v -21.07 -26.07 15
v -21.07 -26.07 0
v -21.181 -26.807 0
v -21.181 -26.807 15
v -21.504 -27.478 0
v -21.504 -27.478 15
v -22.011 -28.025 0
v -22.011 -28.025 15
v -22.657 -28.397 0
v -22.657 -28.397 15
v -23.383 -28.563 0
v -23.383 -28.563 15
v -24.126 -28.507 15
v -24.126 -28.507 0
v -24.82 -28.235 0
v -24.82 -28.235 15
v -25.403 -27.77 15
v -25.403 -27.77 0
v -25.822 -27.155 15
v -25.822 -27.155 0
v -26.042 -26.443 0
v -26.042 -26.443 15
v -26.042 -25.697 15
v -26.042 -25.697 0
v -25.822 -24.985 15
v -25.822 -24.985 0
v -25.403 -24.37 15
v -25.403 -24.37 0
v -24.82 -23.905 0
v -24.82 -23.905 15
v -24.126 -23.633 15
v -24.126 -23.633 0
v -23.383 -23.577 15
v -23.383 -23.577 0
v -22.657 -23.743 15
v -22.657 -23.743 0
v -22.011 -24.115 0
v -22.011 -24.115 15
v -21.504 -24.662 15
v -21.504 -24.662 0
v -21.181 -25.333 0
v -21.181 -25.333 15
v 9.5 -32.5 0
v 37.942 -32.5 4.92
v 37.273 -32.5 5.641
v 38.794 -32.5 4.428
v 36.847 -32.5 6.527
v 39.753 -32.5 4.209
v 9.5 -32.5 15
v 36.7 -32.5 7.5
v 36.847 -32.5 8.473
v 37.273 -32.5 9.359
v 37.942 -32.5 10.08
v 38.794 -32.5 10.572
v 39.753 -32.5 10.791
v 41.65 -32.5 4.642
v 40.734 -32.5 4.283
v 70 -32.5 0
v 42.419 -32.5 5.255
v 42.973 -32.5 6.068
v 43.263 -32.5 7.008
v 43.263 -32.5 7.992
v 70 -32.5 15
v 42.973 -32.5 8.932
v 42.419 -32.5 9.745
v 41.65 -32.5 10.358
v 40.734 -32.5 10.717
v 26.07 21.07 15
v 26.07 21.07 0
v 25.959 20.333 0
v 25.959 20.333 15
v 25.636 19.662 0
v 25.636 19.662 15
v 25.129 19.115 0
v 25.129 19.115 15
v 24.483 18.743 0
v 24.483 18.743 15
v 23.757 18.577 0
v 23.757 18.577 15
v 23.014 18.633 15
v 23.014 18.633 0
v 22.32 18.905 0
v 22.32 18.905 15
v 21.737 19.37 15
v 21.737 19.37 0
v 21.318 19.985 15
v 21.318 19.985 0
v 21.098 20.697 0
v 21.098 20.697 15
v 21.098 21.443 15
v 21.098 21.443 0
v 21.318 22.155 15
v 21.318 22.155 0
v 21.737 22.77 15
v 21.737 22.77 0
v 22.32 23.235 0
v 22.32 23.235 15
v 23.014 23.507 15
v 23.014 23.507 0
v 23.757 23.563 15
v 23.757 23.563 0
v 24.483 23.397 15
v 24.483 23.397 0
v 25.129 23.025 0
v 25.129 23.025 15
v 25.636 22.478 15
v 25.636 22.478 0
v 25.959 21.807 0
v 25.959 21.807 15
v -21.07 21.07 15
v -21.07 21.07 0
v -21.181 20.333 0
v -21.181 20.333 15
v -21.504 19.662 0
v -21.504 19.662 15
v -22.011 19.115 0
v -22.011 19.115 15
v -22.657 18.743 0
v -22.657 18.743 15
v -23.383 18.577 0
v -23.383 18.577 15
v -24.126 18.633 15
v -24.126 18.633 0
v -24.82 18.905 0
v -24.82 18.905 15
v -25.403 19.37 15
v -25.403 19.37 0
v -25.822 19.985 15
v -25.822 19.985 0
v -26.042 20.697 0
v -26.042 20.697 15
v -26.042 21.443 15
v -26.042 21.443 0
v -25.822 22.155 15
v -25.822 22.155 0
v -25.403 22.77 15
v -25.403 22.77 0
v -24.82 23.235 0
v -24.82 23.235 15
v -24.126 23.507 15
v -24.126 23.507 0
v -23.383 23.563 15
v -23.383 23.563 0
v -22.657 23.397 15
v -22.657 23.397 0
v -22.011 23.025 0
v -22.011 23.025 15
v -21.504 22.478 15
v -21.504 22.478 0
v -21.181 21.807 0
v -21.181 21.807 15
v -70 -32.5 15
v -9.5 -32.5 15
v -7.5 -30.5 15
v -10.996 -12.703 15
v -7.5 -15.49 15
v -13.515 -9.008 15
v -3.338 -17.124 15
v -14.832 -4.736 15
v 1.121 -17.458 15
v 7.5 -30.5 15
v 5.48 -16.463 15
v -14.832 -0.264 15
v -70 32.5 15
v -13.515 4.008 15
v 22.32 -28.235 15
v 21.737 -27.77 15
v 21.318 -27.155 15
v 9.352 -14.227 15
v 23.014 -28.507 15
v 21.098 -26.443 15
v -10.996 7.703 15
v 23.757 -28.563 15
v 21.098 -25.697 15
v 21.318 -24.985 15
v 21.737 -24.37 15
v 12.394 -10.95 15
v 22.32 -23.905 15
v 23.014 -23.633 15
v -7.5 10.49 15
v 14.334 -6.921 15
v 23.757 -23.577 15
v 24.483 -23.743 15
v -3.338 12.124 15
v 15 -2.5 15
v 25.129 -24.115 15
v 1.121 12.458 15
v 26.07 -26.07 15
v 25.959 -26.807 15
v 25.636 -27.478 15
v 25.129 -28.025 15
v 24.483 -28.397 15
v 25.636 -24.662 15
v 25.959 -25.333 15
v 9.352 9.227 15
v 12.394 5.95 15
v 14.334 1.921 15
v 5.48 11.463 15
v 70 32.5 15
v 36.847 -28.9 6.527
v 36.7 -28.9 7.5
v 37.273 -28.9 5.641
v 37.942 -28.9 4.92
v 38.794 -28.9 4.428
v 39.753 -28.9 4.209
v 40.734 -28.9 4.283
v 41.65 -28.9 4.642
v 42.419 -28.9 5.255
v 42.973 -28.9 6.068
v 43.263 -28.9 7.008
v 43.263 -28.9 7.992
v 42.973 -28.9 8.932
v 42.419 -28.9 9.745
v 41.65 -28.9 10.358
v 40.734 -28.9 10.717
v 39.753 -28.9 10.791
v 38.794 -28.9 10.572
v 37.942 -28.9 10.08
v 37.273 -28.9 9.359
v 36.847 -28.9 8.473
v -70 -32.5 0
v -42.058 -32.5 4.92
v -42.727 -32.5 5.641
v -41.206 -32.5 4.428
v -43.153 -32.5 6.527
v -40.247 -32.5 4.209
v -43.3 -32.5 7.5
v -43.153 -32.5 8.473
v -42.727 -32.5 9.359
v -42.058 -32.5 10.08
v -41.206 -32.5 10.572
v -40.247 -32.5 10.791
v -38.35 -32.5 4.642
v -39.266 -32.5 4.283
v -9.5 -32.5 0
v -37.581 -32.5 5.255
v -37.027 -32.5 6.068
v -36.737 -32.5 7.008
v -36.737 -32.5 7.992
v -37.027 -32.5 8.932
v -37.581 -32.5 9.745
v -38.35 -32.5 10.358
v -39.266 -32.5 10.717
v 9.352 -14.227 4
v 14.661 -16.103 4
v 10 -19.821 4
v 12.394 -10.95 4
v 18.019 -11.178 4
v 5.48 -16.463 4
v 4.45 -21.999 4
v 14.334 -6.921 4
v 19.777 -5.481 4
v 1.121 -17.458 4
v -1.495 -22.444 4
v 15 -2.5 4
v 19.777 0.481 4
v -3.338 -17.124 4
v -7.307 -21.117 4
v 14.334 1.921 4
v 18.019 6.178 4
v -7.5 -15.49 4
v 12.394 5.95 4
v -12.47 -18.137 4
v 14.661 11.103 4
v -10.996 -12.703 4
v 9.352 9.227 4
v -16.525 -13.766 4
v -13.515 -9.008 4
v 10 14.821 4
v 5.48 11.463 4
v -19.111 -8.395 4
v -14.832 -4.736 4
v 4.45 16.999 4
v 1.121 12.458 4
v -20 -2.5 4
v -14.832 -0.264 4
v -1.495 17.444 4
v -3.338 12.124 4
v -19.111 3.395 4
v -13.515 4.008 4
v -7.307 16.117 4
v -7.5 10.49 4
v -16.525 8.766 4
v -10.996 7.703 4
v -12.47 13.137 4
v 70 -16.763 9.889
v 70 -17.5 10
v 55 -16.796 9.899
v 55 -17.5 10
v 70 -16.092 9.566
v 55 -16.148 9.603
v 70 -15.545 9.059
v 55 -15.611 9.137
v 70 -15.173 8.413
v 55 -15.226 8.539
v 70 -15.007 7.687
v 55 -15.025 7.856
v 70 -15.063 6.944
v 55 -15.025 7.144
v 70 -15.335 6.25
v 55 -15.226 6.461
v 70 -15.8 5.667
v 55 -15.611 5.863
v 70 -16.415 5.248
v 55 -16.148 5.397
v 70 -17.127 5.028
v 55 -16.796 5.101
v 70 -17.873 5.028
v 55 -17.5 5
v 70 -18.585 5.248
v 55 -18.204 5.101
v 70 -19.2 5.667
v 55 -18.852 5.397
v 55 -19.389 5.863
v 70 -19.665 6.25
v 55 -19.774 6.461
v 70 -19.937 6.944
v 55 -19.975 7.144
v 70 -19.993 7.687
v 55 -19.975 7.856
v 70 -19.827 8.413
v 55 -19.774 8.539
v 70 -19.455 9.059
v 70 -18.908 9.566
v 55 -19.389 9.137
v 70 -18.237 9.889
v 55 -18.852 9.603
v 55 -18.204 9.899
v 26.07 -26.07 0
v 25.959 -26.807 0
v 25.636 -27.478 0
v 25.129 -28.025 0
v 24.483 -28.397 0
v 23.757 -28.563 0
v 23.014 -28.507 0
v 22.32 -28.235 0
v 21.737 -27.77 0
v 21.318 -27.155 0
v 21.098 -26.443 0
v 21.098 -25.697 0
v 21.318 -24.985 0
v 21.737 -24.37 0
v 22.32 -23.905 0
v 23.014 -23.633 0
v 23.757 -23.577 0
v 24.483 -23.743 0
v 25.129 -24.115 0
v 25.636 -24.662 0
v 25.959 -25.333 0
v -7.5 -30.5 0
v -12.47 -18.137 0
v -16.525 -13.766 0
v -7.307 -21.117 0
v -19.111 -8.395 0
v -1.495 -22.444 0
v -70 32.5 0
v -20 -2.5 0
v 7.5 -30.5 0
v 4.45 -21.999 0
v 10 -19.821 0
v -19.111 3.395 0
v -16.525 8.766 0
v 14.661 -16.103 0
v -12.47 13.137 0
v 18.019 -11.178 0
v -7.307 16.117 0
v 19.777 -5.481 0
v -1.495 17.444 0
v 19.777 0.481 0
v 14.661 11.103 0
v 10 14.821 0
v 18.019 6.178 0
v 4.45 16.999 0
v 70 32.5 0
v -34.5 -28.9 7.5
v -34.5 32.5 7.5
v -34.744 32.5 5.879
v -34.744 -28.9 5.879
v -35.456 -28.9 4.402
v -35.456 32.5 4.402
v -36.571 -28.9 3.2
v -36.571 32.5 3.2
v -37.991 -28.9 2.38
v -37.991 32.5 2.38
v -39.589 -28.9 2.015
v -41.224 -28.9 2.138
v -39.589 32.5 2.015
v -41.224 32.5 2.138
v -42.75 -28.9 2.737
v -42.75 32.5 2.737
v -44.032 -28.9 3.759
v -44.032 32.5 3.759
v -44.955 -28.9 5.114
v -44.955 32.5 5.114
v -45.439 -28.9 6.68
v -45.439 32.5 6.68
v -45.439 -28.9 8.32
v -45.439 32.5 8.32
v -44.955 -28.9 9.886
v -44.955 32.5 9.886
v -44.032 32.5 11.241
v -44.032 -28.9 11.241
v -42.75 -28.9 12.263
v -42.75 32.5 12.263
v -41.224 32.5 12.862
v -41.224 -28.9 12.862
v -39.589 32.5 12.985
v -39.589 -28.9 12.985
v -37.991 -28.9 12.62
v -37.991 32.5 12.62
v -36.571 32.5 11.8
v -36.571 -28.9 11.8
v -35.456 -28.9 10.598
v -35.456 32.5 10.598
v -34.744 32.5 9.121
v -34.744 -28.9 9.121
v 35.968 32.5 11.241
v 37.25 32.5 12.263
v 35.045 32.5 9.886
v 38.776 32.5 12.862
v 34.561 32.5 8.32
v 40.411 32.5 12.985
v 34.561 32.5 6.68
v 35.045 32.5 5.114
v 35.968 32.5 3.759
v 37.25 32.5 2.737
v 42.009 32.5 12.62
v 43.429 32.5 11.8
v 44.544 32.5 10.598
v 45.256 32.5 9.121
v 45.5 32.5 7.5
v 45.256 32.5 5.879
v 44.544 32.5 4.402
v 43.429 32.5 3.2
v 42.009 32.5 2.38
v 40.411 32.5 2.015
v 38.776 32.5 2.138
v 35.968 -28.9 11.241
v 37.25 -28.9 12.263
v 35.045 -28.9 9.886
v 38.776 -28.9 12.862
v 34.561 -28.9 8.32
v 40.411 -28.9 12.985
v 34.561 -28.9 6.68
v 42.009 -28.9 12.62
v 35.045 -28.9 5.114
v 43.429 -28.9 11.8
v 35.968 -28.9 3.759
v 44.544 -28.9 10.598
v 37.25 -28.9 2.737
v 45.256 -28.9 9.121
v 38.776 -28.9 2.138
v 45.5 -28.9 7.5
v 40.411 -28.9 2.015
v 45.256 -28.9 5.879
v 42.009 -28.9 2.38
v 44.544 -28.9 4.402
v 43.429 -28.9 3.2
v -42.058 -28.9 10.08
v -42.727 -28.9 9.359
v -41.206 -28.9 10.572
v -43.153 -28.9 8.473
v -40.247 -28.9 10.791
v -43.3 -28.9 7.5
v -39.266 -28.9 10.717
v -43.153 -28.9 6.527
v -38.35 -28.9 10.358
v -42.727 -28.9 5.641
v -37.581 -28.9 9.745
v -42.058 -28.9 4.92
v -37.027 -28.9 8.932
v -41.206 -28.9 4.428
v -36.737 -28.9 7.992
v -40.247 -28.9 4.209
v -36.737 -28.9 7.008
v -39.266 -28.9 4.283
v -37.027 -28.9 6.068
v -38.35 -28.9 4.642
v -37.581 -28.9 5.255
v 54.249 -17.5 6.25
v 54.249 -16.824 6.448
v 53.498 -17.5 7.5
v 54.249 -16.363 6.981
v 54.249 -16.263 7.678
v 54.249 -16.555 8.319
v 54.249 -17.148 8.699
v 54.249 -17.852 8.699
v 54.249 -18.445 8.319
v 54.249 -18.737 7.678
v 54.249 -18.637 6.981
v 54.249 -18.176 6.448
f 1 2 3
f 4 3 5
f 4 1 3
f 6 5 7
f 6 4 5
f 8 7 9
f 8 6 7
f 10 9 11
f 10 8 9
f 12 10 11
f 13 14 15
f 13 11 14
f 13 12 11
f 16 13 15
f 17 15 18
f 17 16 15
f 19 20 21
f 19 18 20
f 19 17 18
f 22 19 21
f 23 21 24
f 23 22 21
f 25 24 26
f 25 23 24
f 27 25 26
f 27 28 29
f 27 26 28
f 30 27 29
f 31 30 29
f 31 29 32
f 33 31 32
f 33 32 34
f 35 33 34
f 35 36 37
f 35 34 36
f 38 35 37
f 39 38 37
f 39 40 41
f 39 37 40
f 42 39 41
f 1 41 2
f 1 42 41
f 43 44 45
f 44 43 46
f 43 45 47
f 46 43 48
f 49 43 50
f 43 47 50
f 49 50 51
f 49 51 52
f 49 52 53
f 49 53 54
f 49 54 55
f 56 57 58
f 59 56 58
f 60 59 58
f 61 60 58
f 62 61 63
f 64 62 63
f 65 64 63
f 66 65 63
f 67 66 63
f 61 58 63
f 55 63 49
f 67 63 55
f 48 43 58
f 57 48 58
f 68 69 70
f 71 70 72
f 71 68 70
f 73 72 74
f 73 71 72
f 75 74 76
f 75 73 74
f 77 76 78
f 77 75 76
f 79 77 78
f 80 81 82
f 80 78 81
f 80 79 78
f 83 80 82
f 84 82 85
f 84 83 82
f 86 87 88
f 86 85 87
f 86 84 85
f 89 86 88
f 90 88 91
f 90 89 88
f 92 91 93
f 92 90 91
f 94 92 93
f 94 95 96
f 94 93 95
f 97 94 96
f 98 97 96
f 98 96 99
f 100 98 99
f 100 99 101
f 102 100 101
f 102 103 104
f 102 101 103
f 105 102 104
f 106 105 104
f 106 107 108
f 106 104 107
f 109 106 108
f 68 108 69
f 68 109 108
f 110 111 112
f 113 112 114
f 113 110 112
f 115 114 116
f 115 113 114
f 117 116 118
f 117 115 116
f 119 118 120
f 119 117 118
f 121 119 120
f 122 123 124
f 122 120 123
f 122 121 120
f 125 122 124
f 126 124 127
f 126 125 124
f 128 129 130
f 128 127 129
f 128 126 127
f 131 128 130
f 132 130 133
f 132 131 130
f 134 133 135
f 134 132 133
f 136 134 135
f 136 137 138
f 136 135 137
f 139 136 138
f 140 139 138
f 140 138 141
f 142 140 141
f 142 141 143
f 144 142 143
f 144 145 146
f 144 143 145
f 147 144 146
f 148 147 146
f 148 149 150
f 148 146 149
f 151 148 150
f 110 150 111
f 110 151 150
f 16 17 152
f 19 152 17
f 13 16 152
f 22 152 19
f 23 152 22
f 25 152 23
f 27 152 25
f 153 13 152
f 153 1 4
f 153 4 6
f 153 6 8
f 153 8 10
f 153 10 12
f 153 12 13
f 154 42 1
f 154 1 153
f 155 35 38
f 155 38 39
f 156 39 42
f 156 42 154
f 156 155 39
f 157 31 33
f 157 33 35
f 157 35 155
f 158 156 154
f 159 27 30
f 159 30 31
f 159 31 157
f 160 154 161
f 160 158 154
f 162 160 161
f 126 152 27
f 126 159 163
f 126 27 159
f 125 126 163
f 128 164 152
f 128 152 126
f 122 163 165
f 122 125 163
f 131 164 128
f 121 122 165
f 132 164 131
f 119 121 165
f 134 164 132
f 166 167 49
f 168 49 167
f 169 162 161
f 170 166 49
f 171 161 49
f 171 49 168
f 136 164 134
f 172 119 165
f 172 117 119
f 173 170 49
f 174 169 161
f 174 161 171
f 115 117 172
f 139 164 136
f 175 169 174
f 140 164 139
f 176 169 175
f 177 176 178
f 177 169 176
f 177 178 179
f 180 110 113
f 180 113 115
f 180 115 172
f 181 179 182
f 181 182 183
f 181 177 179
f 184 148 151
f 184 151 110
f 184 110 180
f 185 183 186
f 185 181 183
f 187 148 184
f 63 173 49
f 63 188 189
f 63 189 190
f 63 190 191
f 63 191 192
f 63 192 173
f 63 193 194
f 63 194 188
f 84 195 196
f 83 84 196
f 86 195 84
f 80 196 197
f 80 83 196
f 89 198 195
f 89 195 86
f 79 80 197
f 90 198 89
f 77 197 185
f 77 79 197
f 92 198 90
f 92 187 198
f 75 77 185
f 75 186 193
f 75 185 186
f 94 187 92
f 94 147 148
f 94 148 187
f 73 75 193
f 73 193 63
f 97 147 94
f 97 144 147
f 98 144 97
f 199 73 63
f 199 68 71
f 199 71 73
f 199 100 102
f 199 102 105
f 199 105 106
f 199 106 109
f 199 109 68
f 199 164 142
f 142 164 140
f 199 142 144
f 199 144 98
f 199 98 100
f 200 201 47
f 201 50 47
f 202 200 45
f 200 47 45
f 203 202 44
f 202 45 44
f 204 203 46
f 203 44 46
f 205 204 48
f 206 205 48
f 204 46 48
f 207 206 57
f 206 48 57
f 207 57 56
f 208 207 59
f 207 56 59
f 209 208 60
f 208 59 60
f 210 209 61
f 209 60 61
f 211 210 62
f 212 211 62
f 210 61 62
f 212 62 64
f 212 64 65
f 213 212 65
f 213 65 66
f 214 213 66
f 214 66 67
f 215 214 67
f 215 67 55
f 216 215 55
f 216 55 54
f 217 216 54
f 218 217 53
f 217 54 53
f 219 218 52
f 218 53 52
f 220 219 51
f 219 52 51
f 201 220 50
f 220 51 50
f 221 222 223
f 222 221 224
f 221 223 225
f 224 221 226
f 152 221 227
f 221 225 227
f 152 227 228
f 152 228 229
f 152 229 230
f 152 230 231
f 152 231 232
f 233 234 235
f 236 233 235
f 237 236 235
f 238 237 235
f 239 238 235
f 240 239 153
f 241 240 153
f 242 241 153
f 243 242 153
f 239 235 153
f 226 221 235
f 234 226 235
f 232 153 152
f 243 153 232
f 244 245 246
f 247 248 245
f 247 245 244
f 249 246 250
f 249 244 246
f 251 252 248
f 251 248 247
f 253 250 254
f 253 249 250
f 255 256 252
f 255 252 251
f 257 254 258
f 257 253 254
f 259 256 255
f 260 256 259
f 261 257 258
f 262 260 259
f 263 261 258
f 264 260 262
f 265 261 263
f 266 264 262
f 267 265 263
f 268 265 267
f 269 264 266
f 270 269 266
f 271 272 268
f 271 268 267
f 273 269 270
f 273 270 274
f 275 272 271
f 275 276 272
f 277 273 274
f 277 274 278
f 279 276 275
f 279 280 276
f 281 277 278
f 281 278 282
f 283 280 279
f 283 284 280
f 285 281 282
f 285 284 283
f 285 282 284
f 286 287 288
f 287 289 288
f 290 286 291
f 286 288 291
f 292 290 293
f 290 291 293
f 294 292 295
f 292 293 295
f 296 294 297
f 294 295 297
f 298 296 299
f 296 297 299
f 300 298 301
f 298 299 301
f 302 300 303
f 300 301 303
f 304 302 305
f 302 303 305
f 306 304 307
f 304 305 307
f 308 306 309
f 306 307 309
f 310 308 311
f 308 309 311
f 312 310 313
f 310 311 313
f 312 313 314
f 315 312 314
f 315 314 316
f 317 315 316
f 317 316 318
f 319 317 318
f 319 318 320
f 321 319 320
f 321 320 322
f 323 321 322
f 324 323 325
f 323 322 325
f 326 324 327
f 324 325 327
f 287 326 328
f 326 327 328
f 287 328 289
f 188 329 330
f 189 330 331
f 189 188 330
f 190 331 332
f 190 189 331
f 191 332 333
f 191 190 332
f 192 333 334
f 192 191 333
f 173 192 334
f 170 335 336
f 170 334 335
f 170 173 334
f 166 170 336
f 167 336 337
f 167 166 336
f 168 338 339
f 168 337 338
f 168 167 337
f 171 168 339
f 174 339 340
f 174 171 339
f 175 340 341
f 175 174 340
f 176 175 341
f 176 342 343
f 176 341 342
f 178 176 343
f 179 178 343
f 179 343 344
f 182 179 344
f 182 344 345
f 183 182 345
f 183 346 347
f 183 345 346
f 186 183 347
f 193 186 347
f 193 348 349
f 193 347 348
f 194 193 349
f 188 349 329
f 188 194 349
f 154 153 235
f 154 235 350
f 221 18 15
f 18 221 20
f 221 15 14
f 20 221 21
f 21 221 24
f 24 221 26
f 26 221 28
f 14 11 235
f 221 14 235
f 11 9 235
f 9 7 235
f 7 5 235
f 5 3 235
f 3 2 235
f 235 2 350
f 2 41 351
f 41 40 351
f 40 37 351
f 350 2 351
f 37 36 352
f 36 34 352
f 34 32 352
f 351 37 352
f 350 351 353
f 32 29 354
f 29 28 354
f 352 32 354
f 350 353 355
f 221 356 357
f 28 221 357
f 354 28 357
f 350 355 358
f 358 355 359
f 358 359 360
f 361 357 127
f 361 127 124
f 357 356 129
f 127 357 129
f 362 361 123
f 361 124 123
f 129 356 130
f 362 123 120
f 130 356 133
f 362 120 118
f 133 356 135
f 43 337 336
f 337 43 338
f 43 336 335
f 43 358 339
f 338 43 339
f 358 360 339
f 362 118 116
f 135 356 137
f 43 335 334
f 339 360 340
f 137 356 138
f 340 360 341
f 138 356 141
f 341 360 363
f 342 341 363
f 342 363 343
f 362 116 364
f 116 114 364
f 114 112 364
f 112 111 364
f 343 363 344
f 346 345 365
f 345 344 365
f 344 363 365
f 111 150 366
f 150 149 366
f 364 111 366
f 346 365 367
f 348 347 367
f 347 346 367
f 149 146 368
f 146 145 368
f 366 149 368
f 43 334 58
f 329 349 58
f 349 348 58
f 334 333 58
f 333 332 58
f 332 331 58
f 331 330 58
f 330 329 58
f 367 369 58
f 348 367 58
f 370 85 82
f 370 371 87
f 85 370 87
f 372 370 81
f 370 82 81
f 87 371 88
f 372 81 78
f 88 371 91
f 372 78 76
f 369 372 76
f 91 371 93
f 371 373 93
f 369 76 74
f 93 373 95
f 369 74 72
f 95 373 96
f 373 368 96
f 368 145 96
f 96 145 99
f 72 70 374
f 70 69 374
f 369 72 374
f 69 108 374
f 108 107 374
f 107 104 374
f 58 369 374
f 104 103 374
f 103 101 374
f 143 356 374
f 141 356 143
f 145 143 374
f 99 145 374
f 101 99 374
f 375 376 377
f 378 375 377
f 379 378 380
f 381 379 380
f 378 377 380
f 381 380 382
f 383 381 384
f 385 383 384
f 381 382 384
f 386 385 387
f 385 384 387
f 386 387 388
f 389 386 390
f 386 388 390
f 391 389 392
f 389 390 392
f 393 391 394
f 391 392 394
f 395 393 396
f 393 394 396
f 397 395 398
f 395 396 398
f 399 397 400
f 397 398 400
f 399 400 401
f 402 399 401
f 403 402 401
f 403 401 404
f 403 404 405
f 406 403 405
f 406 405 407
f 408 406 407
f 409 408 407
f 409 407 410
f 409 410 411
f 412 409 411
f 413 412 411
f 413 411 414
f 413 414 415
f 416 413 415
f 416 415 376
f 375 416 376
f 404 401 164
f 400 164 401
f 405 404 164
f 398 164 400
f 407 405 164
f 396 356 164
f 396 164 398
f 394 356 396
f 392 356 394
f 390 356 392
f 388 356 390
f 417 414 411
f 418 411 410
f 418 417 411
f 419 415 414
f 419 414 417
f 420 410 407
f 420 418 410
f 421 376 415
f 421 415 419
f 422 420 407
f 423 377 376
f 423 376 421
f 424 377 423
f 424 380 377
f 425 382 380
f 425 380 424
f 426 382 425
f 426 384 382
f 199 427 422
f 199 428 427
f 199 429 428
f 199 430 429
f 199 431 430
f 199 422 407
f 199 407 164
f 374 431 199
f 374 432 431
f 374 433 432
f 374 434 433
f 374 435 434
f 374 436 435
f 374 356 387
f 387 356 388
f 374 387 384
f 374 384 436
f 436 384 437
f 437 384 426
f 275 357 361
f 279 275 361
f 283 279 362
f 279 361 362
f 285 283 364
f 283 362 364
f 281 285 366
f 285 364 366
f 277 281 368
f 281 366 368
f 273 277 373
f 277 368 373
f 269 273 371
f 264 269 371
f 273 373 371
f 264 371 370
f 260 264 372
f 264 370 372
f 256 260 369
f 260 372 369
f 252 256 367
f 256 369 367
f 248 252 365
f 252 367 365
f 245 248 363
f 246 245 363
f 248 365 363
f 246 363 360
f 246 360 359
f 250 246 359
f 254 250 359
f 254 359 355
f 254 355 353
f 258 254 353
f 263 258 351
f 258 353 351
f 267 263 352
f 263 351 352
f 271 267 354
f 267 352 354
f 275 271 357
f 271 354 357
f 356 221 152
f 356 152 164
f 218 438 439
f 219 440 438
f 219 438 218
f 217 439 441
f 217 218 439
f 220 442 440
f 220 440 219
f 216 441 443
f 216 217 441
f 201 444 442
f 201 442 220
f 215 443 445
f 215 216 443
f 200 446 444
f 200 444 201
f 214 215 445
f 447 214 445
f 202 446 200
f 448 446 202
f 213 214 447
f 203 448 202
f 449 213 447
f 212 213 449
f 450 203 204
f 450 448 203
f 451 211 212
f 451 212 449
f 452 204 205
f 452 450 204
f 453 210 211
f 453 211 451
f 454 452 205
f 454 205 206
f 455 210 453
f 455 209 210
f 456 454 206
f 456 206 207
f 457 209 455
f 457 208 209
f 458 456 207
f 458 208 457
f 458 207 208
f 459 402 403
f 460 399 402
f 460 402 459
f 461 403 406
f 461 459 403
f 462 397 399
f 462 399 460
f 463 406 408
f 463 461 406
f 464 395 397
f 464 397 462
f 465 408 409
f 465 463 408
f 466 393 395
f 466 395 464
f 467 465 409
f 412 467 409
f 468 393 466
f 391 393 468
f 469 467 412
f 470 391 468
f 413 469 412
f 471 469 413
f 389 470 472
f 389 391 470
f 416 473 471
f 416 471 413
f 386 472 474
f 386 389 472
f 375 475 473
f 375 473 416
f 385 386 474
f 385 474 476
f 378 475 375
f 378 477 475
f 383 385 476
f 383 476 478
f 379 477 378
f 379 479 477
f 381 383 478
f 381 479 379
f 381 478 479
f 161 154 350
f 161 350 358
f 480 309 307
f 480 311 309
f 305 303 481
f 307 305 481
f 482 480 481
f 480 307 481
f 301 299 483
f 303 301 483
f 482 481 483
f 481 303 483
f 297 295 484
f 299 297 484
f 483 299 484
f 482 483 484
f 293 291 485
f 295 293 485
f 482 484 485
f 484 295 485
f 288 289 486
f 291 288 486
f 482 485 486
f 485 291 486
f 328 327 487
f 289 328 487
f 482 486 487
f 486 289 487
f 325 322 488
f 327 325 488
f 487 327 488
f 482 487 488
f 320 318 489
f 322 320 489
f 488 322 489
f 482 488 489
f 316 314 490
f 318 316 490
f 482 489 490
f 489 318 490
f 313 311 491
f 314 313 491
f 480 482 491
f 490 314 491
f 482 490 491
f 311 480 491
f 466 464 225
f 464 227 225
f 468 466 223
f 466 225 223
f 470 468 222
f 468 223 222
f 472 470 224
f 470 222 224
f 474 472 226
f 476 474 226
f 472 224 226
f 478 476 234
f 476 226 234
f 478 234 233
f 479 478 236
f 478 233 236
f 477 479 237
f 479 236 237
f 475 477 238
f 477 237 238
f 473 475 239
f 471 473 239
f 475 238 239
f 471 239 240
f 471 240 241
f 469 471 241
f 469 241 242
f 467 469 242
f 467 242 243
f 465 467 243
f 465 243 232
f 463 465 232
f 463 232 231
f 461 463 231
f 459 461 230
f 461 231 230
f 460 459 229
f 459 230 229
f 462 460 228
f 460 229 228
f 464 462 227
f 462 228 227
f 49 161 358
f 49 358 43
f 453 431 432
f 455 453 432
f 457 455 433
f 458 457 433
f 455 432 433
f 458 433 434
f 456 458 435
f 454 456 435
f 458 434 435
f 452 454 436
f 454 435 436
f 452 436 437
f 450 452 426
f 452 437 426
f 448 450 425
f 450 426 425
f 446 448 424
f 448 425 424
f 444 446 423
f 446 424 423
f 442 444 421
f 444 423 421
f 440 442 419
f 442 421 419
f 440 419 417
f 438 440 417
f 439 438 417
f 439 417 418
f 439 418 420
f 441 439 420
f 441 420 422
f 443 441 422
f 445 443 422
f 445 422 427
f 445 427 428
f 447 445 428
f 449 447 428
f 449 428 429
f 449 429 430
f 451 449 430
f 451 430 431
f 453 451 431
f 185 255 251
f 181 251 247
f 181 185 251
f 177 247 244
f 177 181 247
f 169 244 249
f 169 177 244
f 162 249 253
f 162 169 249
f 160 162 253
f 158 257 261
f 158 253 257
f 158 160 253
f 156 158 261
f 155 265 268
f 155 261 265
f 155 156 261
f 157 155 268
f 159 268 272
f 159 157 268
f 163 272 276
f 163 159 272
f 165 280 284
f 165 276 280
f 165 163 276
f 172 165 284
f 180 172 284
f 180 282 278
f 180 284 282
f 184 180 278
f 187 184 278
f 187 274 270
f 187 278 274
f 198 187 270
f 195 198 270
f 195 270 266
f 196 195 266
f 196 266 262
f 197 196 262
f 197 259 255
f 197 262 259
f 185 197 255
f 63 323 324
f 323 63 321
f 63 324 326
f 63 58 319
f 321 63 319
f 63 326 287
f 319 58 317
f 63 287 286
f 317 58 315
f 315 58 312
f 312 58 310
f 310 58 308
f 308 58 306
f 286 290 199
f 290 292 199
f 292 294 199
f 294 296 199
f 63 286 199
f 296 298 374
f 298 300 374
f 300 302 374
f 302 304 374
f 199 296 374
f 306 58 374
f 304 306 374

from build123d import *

# Parameters (mm, degrees)
SKETCH1_W                                           = 140
SKETCH1_H                                           = 65
BOSS_EXTRUDE1_DEPTH                                 = 15
SKETCH2_R                                           = 15
SKETCH2_R_2                                         = 2.5
CUT_EXTRUDE2_DEPTH                                  = 27
TAP_DRILL_FOR_M6_TAP1_D                             = 5
TAP_DRILL_FOR_M6_TAP1_DEPTH                         = 15
TAP_DRILL_FOR_M6_TAP1_TIP                           = 1.502151548
CBORE_FOR_M6_HEX_SOCKET_HEAD_CAP_SCREW3_D           = 6.6
CBORE_FOR_M6_HEX_SOCKET_HEAD_CAP_SCREW3_CBORE_D     = 11
CBORE_FOR_M6_HEX_SOCKET_HEAD_CAP_SCREW3_CBORE_DEPTH = 61.4
SKETCH29_W                                          = 35
SKETCH29_H                                          = 2
CUT_EXTRUDE6_DEPTH                                  = 79.620925968
CHAMFER2_SIZE                                       = 10
SKETCH30_R                                          = 20
CUT_EXTRUDE7_DEPTH                                  = 4


with BuildPart() as part:
    # Sketch1 → Boss-Extrude1 (new body)
    with BuildSketch(Plane.XY):
        Rectangle(SKETCH1_W, SKETCH1_H)
    extrude(amount=BOSS_EXTRUDE1_DEPTH)

    # Sketch2 → Cut-Extrude2 (cut)
    with BuildSketch(Plane(origin=(0, 0, 15), x_dir=(-1, 0, 0), z_dir=(0, 0, -1))):
        with Locations(Location((0, -2.5, 0), (0, 0, 180))):
            Circle(SKETCH2_R)
        with Locations(Location((-23.57, 21.07, 0), (0, 0, 180))):
            Circle(SKETCH2_R_2)
        with Locations(Location((23.57, 21.07, 0), (0, 0, 180))):
            Circle(SKETCH2_R_2)
        with Locations(Location((23.57, -26.07, 0), (0, 0, 180))):
            Circle(SKETCH2_R_2)
        with Locations(Location((-23.57, -26.07, 0), (0, 0, 180))):
            Circle(SKETCH2_R_2)
    extrude(amount=CUT_EXTRUDE2_DEPTH, mode=Mode.SUBTRACT)

    # Tap Drill for M6 Tap1
    with Locations(Plane(origin=(70, 0, 0), x_dir=(0, 0, -1), z_dir=(1, 0, 0))):
        with Locations((-7.5, -17.5)):
            Hole(TAP_DRILL_FOR_M6_TAP1_D / 2, depth=TAP_DRILL_FOR_M6_TAP1_DEPTH)
            with Locations((0, 0, -(TAP_DRILL_FOR_M6_TAP1_DEPTH + TAP_DRILL_FOR_M6_TAP1_TIP / 2))):  # 118° drill point
                Cone(0, TAP_DRILL_FOR_M6_TAP1_D / 2, TAP_DRILL_FOR_M6_TAP1_TIP, mode=Mode.SUBTRACT)

    # CBORE for M6 Hex Socket Head Cap Screw3 (through all)
    with Locations(Plane(origin=(0, 32.5, 0), x_dir=(1, 0, 0), z_dir=(0, 1, 0))):
        with Locations((40, -7.5), (-40, -7.5)):
            CounterBoreHole(CBORE_FOR_M6_HEX_SOCKET_HEAD_CAP_SCREW3_D / 2, CBORE_FOR_M6_HEX_SOCKET_HEAD_CAP_SCREW3_CBORE_D / 2, CBORE_FOR_M6_HEX_SOCKET_HEAD_CAP_SCREW3_CBORE_DEPTH)

    # Sketch29 → Cut-Extrude6 (cut, through all)
    with BuildSketch(Plane.XY.offset(15)):
        with Locations((0, -31.5)):
            Rectangle(SKETCH29_W, SKETCH29_H)
    extrude(amount=-CUT_EXTRUDE6_DEPTH, mode=Mode.SUBTRACT)

    # Chamfer2
    # the kernel refuses this chamfer: 10 mm, written as the material it adds along each edge
    with BuildSketch(Plane(origin=(-17.5, -30.5, 15), x_dir=(-0.027495876610591493, -0.9996219169112965, 0), z_dir=(0, 0, -1))) as chamfer2_piece_1_section:
        Polygon((CHAMFER2_SIZE * 0.999621916911, -CHAMFER2_SIZE * 0.0274958766106), (-CHAMFER2_SIZE * 0.0274958766106, -CHAMFER2_SIZE * 0.999621916911), (0, 0), align=None)
    chamfer2_piece_1 = extrude(amount=15, mode=Mode.PRIVATE)
    chamfer2_piece_1 = split(chamfer2_piece_1, bisect_by=Plane(origin=(-12.880949734, -32.5, 7.5), z_dir=(0, 1, 0)), keep=Keep.TOP, mode=Mode.PRIVATE)
    add(chamfer2_piece_1)
    with BuildSketch(Plane(origin=(17.5, -30.5, 15), x_dir=(-0.9996219169112968, 0.027495876610586317, 0), z_dir=(0, 0, -1))) as chamfer2_piece_2_section:
        Polygon((CHAMFER2_SIZE * 0.999621916911, -CHAMFER2_SIZE * 0.0274958766106), (-CHAMFER2_SIZE * 0.0274958766106, -CHAMFER2_SIZE * 0.999621916911), (0, 0), align=None)
    chamfer2_piece_2 = extrude(amount=15, mode=Mode.PRIVATE)
    chamfer2_piece_2 = split(chamfer2_piece_2, bisect_by=Plane(origin=(12.880949734, -32.5, 7.5), z_dir=(0, 1, 0)), keep=Keep.TOP, mode=Mode.PRIVATE)
    add(chamfer2_piece_2)

    # Sketch30 → Cut-Extrude7 (cut)
    with BuildSketch(Plane(origin=(0, 0, 0), x_dir=(-1, 0, 0), z_dir=(0, 0, -1))):
        with Locations((0, -2.5)):
            Circle(SKETCH30_R)
    extrude(amount=-CUT_EXTRUDE7_DEPTH, mode=Mode.SUBTRACT)


solid = part.part
